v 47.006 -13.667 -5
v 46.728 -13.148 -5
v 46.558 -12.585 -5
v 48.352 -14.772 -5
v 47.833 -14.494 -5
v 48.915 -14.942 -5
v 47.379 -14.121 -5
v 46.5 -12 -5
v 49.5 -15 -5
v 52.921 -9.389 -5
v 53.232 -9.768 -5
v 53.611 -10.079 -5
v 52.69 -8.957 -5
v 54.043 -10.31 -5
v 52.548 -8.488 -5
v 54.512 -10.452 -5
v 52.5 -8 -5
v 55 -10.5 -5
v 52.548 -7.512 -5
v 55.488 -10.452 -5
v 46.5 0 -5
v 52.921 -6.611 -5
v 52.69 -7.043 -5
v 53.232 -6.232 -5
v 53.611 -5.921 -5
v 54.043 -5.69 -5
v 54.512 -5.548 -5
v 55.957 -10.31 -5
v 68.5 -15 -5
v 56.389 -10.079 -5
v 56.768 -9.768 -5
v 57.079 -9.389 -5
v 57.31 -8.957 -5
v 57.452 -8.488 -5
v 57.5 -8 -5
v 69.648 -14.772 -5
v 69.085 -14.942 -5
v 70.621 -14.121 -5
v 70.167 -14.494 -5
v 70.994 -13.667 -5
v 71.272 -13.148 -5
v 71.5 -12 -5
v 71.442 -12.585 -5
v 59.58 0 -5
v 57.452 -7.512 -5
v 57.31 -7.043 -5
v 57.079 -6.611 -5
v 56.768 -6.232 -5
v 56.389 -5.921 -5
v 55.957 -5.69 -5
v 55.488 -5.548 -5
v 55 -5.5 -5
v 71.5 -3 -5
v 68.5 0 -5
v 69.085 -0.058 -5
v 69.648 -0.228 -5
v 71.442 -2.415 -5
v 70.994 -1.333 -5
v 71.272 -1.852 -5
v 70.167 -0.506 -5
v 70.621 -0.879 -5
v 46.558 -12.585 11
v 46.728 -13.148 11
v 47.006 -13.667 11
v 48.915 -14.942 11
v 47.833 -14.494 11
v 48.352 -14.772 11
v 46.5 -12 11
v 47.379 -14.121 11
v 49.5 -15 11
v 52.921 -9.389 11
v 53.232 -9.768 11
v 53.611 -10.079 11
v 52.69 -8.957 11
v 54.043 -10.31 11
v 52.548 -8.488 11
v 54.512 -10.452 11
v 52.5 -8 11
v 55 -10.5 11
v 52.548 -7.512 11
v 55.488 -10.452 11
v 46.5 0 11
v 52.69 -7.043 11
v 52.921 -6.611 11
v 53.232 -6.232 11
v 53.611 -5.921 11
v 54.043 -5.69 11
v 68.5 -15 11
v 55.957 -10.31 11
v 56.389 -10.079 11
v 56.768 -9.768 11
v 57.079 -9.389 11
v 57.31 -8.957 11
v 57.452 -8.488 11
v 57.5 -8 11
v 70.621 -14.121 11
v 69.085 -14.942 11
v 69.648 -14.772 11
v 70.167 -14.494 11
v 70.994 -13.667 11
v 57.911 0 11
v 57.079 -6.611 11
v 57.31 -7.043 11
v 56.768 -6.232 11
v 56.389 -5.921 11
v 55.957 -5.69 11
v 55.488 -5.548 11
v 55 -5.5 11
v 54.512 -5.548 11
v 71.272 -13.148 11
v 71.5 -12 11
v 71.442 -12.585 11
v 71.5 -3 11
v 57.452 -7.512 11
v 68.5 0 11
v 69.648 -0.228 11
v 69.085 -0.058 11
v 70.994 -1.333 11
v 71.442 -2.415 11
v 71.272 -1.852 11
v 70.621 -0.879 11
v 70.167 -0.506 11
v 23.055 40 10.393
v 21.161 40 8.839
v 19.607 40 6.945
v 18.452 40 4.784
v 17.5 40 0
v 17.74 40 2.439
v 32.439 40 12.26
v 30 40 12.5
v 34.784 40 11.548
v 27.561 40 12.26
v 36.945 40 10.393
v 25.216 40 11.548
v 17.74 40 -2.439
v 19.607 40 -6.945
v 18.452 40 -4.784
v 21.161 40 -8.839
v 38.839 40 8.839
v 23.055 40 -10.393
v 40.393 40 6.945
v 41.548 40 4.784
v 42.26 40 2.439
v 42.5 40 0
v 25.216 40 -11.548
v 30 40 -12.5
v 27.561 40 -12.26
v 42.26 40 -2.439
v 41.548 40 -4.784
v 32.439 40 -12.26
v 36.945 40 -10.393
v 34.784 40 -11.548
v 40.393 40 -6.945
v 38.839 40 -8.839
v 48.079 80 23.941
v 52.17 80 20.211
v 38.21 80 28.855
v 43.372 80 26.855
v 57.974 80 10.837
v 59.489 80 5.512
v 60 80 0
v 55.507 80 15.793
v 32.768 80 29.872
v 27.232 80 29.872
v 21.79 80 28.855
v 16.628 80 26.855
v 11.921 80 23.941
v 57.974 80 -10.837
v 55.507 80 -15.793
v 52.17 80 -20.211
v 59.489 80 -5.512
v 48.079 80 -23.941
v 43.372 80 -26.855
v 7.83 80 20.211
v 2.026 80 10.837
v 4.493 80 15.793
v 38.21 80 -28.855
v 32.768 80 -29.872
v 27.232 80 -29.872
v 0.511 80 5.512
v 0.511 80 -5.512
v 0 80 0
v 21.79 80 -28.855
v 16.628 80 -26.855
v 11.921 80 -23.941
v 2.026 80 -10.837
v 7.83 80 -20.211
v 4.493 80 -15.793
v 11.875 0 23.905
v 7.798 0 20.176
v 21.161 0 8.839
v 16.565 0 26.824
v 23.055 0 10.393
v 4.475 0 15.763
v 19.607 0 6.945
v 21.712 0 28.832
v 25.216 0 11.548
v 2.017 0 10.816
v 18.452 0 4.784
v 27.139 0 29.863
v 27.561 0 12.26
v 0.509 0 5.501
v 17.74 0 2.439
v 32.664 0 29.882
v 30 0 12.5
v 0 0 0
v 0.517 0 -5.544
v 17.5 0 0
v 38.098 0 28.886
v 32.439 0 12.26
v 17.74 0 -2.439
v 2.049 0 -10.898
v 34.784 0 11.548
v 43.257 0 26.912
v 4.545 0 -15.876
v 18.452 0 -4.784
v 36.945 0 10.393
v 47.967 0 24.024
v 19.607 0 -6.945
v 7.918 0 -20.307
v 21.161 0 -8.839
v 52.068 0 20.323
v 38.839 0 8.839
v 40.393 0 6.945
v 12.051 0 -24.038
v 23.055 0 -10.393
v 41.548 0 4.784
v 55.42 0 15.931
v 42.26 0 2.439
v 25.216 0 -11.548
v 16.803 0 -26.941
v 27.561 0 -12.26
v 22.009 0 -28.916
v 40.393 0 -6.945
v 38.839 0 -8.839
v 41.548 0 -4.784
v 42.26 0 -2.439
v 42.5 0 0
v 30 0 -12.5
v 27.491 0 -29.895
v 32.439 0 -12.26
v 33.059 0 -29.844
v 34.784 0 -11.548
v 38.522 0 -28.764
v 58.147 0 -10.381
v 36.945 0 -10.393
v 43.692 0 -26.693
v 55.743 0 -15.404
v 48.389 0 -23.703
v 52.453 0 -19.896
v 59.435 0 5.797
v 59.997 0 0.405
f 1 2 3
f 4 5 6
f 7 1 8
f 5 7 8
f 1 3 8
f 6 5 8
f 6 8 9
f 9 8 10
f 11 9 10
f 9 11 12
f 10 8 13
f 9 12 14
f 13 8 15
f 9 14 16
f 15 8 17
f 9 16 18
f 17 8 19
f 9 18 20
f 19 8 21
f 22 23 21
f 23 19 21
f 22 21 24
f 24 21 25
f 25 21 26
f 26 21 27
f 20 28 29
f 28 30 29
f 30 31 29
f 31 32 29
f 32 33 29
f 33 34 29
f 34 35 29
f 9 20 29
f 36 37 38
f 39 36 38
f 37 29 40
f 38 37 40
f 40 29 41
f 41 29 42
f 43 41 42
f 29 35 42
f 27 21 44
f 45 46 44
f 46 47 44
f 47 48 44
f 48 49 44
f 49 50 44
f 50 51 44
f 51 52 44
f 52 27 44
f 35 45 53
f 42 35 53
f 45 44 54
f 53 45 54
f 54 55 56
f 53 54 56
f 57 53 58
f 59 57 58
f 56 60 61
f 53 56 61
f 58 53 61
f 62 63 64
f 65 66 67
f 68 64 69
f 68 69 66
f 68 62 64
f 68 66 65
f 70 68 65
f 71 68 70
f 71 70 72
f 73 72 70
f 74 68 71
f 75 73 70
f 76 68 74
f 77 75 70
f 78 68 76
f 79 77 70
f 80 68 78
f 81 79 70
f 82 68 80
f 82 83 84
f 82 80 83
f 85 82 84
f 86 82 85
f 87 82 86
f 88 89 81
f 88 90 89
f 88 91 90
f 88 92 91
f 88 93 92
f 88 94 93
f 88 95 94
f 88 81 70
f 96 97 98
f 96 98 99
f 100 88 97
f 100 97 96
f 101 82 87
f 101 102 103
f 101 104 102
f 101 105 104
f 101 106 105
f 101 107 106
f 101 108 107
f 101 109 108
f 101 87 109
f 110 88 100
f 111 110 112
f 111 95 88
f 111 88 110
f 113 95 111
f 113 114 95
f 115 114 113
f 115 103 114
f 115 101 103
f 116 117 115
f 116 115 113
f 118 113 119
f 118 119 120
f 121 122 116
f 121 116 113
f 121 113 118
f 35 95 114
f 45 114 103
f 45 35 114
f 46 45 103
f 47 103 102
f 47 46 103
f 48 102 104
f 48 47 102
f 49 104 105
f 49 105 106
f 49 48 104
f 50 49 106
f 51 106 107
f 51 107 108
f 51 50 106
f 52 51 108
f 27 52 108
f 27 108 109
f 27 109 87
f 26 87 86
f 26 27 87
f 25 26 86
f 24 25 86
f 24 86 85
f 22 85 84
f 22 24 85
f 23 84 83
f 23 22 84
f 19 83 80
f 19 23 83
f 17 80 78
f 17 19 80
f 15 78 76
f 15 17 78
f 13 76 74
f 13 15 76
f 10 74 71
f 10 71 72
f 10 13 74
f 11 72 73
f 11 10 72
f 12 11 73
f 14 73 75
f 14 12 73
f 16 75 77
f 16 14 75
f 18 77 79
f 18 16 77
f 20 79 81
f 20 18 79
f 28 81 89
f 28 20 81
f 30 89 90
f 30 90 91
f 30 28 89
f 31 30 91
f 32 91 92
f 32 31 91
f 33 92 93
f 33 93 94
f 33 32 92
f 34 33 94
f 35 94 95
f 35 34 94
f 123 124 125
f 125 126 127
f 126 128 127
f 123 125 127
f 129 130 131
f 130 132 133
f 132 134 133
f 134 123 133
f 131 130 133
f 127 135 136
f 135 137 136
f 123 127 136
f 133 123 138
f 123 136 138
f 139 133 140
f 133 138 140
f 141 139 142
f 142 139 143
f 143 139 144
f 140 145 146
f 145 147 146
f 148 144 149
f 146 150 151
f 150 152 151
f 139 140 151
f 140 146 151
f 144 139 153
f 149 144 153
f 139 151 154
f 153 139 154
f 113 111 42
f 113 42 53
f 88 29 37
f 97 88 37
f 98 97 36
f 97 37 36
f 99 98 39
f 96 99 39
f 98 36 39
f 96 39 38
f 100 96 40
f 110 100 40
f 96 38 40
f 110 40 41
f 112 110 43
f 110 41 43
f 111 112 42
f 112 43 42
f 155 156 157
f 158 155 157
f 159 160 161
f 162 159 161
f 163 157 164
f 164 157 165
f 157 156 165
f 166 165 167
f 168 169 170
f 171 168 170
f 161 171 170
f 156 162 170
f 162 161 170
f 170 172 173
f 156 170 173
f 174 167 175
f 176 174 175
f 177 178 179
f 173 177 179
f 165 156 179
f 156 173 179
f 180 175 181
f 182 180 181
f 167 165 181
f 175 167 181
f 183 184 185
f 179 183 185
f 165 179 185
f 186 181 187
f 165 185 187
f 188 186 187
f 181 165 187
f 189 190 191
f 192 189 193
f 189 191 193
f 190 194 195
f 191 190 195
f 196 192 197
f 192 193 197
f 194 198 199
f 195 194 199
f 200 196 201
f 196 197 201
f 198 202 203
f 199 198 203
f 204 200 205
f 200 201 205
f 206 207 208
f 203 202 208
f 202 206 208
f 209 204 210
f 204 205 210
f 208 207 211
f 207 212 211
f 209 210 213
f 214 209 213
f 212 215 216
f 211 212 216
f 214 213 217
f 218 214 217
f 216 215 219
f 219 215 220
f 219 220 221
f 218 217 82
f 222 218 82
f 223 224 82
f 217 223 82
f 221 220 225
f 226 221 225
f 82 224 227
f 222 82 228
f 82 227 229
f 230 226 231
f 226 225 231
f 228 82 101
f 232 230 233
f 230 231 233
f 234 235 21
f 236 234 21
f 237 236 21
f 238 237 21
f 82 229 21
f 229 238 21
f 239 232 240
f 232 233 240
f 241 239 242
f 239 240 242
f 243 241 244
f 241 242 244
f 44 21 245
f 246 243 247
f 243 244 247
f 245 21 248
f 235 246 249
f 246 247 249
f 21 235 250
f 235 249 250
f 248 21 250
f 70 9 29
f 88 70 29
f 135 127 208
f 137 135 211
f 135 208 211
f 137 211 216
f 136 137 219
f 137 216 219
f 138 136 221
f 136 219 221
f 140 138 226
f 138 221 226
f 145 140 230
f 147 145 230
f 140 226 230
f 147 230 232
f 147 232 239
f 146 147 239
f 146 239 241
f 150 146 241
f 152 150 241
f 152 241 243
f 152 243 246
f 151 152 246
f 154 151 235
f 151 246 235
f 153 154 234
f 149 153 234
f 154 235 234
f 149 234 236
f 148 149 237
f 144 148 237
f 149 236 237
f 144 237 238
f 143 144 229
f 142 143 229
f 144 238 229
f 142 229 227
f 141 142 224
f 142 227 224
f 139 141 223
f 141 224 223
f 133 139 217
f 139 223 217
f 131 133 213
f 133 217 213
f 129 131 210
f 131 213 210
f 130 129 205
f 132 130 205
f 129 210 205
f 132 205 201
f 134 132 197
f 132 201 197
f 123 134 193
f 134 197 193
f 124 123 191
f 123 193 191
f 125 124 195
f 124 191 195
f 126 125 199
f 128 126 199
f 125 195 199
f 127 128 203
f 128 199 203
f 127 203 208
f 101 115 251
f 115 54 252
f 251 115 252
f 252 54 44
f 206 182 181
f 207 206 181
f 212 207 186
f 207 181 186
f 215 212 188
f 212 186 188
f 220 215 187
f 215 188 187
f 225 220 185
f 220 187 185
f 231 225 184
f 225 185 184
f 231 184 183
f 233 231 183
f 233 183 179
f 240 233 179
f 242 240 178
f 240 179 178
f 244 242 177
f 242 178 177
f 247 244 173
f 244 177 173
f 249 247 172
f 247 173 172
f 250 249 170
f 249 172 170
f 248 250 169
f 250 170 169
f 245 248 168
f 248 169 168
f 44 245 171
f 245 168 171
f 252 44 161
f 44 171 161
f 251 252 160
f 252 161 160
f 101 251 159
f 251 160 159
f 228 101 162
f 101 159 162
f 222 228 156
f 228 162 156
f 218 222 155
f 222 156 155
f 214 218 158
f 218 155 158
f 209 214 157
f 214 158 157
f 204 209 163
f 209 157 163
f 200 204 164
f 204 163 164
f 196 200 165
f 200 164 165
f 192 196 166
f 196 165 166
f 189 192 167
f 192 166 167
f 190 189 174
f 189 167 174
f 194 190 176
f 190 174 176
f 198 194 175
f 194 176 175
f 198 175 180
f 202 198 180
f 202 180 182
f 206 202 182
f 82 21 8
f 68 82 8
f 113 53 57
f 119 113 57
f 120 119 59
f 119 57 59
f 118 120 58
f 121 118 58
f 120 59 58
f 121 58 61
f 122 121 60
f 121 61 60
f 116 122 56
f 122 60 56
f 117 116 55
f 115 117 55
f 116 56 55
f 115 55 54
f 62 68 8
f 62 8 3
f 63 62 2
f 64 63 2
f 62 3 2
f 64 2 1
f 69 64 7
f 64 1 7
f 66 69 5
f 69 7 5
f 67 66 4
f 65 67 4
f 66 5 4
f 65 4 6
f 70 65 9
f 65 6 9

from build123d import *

# Parameters (mm, degrees)
BOSS_EXTRUDE5_DEPTH      = 11
BOSS_EXTRUDE5_DEPTH_BACK = 5
SKETCH2_R                = 2.5


with BuildPart() as part:
    # Sketch1 → Revolve1 (revolve)
    with BuildSketch(Plane.XY, mode=Mode.PRIVATE) as revolve1_sk:
        Polygon((60, 80), (30, 80), (30, 40), (42.5, 40), (42.5, 0), (60, 0), align=None)
    revolve(revolve1_sk.sketch.rotate(Axis((30, 80, 0), (0, -1, 0)), 180), axis=Axis((30, 80, 0), (0, -1, 0)))

    # Sketch2 → Boss-Extrude5 (add, two sides: drawn at the far end of the back side and taken through both)
    with BuildSketch(Plane.XY.offset(-BOSS_EXTRUDE5_DEPTH_BACK)):
        with BuildLine():
            Line((46.5, 0), (46.5, -12))
            ThreePointArc((46.5, -12), (47.378679656, -14.121320344), (49.5, -15))
            Line((49.5, -15), (68.5, -15))
            ThreePointArc((68.5, -15), (70.621320344, -14.121320344), (71.5, -12))
            Line((71.5, -12), (71.5, -3))
            ThreePointArc((71.5, -3), (70.621320344, -0.878679656), (68.5, 0))
            Line((68.5, 0), (46.5, 0))
        make_face()
        with Locations((55, -8)):
            Circle(SKETCH2_R, mode=Mode.SUBTRACT)
    extrude(amount=BOSS_EXTRUDE5_DEPTH + BOSS_EXTRUDE5_DEPTH_BACK)


solid = part.part
